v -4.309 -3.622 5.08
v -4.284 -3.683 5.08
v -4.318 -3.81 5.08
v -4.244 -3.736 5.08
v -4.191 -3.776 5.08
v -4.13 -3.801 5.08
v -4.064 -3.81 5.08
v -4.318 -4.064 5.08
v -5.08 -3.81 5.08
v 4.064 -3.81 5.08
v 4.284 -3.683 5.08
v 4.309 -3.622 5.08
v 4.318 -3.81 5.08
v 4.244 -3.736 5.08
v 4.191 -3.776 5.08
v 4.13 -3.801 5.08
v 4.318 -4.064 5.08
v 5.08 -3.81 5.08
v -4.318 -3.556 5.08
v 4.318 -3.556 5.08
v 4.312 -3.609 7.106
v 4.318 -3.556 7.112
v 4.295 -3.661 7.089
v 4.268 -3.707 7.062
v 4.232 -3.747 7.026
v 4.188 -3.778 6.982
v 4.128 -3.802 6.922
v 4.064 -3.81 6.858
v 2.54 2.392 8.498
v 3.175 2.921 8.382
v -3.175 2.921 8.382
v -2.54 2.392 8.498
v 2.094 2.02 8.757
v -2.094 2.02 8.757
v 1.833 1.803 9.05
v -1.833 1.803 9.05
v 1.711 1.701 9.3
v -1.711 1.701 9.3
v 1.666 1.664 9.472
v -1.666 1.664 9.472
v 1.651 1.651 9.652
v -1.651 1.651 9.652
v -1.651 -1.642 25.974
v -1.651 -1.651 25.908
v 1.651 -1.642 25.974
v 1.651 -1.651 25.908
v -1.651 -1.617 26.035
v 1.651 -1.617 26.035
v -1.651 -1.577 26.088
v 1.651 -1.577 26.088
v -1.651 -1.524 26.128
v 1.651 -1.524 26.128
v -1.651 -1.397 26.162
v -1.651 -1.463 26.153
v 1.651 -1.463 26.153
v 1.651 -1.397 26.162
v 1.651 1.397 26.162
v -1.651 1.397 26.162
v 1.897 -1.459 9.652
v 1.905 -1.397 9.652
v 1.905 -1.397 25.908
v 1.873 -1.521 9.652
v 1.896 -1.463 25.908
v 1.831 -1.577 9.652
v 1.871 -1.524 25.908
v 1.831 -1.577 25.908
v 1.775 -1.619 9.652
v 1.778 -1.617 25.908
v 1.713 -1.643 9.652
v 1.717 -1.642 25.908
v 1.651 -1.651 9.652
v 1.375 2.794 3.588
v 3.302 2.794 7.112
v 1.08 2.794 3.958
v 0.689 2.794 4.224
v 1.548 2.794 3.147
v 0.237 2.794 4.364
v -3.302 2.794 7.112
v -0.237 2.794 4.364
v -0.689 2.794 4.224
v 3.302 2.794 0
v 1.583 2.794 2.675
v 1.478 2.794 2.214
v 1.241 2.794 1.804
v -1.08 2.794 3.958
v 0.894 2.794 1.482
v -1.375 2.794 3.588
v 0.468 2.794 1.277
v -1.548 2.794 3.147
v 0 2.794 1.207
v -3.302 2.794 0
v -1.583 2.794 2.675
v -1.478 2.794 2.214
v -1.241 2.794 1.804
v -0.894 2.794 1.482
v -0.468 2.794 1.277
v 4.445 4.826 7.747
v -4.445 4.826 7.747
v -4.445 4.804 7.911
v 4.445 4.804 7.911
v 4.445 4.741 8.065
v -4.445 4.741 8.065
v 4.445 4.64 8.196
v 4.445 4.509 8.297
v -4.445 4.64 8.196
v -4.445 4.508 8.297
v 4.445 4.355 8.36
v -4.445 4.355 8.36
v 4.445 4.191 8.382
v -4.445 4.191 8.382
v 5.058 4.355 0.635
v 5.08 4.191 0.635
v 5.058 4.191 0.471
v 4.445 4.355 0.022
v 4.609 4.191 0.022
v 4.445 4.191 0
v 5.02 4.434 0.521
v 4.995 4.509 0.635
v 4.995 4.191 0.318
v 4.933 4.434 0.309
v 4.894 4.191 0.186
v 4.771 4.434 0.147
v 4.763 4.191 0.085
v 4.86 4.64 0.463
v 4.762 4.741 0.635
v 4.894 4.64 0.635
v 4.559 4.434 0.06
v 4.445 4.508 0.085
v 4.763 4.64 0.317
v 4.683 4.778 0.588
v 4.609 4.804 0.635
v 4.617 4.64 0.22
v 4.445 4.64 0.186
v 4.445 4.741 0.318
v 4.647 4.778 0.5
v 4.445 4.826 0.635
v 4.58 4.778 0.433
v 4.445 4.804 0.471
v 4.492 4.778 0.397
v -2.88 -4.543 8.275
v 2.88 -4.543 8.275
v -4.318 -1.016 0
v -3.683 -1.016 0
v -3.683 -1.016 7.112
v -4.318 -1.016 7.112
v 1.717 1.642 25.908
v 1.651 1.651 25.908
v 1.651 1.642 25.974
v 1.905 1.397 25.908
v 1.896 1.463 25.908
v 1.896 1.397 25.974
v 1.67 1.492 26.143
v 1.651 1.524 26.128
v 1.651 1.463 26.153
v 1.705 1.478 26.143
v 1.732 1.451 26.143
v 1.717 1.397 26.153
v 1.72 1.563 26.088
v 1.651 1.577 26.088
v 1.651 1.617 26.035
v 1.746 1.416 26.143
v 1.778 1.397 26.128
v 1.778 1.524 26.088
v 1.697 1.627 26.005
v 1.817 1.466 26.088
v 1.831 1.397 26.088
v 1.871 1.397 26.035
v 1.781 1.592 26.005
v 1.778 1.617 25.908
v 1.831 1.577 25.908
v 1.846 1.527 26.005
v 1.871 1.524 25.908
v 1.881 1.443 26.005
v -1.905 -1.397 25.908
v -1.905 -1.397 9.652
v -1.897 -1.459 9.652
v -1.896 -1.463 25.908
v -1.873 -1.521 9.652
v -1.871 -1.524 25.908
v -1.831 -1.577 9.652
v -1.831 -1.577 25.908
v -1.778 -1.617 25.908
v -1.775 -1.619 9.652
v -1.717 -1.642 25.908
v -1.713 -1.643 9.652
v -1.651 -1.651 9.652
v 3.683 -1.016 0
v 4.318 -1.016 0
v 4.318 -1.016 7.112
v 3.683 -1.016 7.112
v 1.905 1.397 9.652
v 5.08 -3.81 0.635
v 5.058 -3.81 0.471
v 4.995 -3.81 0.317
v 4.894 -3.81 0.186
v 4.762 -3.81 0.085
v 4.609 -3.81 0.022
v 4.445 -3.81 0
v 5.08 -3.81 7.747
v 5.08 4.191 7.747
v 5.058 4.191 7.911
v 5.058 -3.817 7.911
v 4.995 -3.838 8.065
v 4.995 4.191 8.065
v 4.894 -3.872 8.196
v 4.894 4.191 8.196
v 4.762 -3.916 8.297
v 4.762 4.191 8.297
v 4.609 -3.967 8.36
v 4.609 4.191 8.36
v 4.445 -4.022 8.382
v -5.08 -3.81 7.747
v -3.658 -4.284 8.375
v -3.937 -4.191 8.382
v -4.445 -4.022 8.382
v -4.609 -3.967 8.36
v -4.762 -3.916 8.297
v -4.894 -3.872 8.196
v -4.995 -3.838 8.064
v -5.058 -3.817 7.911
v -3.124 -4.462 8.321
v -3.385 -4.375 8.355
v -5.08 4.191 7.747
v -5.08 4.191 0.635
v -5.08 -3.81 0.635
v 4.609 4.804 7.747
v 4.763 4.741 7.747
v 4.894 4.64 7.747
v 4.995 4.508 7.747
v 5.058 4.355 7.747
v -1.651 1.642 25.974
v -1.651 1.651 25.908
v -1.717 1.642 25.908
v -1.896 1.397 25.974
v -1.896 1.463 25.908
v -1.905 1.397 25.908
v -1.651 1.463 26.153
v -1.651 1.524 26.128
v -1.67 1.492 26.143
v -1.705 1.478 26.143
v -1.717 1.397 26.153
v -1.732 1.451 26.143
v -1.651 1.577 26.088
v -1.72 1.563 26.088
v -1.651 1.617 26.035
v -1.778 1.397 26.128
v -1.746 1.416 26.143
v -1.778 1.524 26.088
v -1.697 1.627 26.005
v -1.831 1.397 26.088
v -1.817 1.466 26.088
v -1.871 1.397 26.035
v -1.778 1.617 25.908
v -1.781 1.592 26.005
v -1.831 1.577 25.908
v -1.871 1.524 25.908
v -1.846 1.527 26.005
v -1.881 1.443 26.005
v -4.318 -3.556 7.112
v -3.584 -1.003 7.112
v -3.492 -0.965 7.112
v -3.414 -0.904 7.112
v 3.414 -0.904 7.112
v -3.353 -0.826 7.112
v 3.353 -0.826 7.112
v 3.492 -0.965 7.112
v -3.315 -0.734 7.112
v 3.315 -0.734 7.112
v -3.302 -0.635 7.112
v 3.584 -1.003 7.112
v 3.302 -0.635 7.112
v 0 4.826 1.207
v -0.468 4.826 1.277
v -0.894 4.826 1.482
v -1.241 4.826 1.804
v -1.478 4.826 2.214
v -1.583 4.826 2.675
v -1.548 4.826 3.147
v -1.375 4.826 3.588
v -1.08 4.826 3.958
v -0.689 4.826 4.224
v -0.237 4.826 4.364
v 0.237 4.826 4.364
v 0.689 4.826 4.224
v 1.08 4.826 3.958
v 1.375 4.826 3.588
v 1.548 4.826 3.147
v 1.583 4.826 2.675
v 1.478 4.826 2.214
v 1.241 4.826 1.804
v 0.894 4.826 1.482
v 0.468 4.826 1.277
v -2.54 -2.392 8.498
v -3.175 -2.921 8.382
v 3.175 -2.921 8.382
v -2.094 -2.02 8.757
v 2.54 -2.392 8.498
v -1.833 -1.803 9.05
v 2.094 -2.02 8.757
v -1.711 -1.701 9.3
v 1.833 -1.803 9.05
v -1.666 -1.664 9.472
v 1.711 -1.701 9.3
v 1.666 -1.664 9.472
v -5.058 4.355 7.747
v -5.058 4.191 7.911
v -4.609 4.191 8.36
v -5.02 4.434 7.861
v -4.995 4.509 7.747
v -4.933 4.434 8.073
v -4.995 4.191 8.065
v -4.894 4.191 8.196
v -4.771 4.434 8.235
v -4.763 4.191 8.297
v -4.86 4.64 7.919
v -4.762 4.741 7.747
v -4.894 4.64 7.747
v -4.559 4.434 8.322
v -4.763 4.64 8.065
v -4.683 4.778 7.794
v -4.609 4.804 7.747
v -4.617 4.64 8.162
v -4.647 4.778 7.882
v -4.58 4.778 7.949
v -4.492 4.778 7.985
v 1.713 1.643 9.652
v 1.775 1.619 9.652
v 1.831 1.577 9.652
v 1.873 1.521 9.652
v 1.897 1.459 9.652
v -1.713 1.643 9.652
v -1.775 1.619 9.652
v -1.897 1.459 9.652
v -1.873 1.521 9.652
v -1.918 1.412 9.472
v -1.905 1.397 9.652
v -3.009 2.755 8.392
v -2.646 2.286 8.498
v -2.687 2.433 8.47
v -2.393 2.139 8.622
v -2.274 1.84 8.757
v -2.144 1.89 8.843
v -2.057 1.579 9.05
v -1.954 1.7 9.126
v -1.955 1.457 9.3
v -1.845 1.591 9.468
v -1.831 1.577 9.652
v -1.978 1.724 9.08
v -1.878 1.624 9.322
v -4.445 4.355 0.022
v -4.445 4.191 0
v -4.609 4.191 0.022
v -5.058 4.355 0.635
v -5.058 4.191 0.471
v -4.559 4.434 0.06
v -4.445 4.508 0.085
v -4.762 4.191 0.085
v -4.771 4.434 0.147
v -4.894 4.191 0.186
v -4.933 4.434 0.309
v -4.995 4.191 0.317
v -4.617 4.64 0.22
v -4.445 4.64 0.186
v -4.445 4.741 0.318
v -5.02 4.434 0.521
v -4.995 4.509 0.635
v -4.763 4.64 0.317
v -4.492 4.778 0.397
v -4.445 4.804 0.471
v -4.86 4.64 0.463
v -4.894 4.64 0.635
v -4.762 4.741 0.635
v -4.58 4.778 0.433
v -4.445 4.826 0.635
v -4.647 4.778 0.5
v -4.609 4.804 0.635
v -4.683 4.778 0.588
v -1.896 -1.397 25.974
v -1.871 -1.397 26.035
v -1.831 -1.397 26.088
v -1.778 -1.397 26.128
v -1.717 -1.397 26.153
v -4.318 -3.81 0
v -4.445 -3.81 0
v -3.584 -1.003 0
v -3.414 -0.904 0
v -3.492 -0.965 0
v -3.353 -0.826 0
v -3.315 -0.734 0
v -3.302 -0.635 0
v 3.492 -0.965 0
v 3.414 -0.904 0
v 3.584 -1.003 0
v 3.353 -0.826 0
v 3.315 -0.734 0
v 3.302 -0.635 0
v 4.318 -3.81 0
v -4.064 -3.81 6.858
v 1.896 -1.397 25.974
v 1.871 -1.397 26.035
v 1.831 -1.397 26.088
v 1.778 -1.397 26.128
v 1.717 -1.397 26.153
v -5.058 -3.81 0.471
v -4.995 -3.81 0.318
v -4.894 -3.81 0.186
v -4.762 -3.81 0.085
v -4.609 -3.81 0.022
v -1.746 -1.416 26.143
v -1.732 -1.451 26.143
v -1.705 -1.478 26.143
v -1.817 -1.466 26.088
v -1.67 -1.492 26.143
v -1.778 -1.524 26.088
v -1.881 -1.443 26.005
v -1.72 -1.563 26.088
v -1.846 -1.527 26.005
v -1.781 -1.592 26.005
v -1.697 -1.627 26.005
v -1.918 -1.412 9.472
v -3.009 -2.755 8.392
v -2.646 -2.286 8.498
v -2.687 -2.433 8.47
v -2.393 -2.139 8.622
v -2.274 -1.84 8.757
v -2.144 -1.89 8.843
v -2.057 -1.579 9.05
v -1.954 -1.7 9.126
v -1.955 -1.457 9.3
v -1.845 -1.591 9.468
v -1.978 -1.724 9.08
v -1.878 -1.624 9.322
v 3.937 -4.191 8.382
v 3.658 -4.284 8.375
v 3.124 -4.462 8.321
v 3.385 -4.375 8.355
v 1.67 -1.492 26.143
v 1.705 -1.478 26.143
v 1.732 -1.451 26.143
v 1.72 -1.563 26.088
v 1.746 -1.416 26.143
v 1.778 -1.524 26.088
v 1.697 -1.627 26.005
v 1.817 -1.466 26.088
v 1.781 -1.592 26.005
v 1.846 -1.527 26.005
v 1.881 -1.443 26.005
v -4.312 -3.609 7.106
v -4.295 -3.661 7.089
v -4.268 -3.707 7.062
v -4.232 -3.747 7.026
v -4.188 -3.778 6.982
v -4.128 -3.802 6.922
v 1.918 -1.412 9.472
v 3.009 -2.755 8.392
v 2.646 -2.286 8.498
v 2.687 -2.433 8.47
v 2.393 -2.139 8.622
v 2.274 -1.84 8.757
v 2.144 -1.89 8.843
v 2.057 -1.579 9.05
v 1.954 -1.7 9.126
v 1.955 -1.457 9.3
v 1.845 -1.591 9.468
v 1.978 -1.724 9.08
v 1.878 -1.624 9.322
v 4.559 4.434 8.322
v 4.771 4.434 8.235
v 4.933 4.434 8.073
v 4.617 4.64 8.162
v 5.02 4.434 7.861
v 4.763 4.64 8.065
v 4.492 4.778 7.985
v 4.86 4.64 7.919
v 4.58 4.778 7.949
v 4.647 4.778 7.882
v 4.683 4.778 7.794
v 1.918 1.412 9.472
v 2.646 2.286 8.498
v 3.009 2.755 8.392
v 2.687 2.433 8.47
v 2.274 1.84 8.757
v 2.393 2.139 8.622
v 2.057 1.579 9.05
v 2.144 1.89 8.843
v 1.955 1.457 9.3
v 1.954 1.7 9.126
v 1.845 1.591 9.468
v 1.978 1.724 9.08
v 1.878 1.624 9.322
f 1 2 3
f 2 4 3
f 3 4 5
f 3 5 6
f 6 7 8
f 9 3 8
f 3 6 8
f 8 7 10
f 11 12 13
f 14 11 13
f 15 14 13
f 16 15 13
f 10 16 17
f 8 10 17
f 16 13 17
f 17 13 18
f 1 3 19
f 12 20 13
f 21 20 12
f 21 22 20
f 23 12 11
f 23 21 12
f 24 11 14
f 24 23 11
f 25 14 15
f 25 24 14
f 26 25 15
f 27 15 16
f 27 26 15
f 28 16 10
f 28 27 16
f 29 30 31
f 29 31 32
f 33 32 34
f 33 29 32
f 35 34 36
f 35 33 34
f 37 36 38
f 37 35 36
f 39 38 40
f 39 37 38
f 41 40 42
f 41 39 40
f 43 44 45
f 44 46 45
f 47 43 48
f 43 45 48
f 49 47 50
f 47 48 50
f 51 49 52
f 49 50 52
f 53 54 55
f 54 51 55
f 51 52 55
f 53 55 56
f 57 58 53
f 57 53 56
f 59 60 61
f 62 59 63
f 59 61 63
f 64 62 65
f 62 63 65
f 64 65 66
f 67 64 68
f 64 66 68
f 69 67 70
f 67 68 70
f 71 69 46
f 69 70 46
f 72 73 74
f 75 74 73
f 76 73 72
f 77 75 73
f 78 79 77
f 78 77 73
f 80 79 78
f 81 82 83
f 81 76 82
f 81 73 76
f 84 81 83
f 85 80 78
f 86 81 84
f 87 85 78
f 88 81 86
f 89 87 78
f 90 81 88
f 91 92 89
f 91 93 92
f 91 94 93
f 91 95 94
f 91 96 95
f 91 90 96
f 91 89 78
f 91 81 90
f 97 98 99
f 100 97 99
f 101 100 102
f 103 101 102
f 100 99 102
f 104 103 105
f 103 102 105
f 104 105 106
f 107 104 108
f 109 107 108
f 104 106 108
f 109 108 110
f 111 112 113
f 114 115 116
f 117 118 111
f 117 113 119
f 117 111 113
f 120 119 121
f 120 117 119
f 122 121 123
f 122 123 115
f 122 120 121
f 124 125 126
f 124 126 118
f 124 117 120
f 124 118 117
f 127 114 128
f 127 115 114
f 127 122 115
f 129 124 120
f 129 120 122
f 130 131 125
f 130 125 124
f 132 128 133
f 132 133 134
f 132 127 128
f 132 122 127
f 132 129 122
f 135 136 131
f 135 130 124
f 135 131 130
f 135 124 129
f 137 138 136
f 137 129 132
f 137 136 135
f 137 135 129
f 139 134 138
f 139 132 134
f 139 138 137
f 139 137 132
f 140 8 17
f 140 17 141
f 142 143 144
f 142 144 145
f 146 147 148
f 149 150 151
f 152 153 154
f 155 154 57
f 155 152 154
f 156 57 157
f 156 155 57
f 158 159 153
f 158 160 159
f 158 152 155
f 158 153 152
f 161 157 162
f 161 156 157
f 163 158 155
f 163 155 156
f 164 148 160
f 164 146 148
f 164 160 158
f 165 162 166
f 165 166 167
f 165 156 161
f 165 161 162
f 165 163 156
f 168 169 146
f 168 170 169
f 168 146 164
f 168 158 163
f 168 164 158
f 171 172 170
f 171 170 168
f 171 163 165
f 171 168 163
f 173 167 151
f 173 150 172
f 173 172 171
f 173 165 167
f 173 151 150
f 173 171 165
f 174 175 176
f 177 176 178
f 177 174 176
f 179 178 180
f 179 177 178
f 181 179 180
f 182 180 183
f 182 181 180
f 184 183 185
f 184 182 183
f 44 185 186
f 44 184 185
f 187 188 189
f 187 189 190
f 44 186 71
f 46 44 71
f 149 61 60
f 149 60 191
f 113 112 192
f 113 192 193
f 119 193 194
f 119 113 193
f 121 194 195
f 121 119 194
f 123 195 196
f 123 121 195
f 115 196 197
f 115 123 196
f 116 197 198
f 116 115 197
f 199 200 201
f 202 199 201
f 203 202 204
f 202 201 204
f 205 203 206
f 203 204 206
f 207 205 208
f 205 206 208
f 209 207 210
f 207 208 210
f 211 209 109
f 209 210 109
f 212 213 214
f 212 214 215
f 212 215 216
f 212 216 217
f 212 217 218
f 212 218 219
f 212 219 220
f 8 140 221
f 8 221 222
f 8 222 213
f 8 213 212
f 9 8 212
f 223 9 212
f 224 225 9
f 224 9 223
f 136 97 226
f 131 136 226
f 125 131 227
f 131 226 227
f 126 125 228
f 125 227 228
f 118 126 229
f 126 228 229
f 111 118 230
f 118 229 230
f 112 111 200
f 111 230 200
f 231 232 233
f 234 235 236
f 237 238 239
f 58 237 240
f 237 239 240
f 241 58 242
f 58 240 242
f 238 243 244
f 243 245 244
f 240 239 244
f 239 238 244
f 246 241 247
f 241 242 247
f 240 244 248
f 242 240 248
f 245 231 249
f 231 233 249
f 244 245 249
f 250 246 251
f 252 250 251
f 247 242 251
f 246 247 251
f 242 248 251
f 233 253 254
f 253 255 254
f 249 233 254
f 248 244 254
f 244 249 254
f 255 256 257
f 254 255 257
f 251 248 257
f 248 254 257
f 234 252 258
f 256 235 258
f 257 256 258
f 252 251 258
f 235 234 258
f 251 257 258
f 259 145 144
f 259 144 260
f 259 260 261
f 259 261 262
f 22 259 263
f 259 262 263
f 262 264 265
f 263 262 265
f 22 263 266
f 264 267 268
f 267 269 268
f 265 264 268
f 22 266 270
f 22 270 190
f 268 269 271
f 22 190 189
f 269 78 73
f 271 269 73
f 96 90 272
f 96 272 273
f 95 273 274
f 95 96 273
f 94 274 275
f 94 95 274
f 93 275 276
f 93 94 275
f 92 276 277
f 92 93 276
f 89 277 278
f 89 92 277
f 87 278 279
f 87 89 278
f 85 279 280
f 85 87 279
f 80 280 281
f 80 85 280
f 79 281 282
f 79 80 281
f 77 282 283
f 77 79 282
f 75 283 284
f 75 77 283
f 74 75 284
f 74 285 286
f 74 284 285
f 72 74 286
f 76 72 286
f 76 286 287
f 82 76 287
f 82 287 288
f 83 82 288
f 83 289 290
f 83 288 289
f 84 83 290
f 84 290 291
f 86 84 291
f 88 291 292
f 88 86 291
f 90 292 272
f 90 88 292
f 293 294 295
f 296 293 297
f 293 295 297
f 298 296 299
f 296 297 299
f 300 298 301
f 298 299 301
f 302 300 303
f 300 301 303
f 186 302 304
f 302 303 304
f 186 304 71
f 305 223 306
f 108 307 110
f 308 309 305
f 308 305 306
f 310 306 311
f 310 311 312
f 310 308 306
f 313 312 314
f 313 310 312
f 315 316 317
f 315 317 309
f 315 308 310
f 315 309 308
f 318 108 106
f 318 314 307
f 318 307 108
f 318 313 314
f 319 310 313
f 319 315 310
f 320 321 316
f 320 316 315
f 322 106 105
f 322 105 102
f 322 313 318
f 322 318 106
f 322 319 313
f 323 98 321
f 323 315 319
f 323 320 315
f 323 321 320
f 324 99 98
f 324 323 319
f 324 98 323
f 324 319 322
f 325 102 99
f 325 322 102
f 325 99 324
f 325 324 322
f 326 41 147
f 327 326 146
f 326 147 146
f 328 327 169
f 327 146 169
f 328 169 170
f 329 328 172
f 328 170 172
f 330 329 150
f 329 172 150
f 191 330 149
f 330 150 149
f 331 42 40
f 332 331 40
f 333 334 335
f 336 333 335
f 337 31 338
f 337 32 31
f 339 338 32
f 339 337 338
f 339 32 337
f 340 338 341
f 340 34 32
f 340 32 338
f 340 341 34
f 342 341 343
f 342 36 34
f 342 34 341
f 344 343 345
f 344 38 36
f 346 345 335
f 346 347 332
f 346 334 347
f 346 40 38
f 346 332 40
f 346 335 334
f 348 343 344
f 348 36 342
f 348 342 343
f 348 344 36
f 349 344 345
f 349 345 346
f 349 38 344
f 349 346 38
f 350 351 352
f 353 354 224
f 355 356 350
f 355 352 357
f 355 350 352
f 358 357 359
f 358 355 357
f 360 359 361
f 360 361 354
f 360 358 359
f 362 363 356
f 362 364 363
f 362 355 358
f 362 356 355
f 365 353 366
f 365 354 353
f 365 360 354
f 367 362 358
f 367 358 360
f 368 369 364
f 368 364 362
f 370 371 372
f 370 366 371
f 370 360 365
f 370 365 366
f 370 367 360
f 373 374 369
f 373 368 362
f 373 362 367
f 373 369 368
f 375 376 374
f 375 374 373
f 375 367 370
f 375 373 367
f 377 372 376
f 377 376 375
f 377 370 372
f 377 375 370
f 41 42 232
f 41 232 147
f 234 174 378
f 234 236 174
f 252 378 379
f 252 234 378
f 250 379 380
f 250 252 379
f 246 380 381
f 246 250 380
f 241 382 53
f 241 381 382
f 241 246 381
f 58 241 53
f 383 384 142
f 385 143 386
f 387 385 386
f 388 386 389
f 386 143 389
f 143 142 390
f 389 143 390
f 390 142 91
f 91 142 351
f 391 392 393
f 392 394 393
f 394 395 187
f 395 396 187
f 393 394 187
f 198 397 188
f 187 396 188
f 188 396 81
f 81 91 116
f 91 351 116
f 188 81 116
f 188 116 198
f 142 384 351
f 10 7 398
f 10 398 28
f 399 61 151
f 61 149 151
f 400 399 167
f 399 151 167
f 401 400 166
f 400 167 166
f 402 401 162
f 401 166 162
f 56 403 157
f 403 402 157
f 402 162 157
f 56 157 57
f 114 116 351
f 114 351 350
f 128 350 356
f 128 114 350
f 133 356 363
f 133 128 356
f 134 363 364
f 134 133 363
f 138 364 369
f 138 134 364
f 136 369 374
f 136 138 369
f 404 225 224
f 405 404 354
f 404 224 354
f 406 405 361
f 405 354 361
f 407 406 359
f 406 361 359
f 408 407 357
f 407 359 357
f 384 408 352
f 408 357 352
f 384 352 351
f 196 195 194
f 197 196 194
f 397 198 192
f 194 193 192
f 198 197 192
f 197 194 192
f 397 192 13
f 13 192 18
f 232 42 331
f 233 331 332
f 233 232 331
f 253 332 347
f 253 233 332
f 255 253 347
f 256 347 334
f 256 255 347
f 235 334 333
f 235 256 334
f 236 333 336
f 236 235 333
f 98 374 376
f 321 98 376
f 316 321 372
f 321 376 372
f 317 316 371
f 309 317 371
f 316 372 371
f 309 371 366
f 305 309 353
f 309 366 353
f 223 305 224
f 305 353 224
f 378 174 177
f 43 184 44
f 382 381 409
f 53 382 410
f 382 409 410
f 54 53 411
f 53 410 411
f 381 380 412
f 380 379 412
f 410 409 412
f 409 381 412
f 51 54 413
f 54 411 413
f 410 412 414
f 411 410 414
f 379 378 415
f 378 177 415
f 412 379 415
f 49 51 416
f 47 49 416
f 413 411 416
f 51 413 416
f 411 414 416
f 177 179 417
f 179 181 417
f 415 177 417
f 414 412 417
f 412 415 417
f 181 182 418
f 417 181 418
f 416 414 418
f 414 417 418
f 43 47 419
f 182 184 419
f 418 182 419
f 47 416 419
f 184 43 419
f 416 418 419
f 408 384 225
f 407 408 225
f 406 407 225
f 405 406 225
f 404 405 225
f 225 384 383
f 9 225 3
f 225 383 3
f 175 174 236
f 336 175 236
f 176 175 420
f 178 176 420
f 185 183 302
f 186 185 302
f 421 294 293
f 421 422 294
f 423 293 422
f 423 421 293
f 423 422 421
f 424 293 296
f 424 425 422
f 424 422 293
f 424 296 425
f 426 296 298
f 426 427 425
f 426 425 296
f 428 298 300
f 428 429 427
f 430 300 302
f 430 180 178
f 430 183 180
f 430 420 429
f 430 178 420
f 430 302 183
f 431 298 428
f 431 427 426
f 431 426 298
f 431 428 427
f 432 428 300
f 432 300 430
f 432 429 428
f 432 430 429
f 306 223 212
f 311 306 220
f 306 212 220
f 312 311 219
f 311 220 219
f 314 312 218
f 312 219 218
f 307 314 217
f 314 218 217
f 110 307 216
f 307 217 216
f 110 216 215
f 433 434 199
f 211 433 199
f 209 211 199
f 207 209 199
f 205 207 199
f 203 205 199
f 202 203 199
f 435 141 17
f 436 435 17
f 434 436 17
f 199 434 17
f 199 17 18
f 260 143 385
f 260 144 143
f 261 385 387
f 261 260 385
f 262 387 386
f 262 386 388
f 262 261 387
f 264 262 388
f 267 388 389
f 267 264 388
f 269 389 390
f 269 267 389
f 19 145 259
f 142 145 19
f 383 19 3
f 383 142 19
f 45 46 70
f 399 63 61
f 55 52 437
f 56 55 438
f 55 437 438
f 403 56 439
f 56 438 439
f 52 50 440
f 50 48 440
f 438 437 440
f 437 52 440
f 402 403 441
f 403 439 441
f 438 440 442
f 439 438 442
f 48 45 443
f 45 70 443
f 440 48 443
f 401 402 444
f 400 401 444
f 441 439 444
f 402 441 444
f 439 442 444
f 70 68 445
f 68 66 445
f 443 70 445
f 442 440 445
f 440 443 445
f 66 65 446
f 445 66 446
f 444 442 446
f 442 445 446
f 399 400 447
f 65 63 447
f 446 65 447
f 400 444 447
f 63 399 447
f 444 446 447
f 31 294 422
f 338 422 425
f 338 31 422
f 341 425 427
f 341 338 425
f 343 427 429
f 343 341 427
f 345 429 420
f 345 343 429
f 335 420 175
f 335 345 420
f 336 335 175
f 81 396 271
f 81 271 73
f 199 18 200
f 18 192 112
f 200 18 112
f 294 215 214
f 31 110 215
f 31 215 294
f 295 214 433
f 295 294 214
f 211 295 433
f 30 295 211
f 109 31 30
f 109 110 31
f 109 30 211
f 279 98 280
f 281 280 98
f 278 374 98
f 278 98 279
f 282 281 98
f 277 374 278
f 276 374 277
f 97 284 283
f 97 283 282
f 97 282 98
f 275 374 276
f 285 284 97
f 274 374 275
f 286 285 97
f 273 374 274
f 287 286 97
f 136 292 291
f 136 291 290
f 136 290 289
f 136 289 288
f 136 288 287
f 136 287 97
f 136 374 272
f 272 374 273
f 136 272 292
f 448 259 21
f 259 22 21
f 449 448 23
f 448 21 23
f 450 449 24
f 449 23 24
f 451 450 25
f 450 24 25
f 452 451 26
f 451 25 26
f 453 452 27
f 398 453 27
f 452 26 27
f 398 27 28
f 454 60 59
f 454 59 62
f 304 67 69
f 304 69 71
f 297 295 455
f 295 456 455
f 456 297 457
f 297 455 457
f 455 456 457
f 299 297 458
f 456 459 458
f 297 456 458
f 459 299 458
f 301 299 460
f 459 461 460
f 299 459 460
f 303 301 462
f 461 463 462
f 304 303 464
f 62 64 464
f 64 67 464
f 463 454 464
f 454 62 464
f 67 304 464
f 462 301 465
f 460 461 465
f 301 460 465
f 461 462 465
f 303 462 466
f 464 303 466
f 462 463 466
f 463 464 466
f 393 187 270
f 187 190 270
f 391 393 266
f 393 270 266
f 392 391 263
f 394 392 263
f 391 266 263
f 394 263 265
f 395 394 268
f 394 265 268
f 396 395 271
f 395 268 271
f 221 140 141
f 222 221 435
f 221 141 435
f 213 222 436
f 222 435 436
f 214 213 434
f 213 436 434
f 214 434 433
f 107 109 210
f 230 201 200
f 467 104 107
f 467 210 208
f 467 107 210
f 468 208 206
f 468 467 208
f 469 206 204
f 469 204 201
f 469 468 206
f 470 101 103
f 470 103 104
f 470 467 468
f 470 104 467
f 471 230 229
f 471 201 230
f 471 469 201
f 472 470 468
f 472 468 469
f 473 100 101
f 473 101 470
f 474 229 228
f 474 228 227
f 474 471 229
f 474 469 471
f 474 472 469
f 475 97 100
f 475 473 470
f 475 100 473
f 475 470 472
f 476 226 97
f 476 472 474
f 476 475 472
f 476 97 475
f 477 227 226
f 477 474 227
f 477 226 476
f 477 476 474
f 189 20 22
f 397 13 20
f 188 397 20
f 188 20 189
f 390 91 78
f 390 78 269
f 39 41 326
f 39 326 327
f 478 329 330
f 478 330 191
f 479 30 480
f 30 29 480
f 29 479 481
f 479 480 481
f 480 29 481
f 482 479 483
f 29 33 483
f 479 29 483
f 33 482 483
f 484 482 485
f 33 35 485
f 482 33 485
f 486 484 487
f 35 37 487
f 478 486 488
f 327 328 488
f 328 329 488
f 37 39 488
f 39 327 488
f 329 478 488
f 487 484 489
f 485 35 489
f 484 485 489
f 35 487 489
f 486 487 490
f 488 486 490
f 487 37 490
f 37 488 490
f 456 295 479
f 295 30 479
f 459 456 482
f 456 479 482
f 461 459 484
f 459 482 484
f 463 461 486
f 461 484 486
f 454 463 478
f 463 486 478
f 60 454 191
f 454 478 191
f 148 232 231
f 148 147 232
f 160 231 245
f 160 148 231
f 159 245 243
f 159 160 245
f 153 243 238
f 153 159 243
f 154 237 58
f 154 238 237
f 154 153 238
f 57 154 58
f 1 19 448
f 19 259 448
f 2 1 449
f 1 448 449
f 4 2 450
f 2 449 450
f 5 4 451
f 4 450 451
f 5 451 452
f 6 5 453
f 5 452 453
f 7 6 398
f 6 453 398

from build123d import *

# Parameters (mm, degrees)
SKETCH1_W               = 10.16
SKETCH1_H               = 9.652
BOSS_EXTRUDE1_DEPTH     = 7.112
CUT_EXTRUDE1_DEPTH      = 14.021061708
CUT_EXTRUDE1_DEPTH_BACK = 14.021061708
SKETCH2_R               = 1.5875
SKETCH7_W               = 10.16
SKETCH7_H               = 9.652
BOSS_EXTRUDE3_DEPTH     = 1.27
FILLET1_R               = 0.635
FILLET3_R               = 0.635
FILLET4_R               = 0.381
CUT_EXTRUDE3_DEPTH      = 14.485940976
CUT_EXTRUDE3_DEPTH_BACK = 14.485940976
FILLET9_R               = 0.254
CUT_EXTRUDE7_DEPTH      = 9.654656319
SKETCH14_W              = 3.81
SKETCH14_H              = 3.302
BOSS_EXTRUDE4_DEPTH     = 17.78
FILLET14_R              = 1.27
FILLET15_R              = 0.254


with BuildPart() as part:
    # Sketch1 → Boss-Extrude1 (new body)
    with BuildSketch(Plane.XY):
        Rectangle(SKETCH1_W, SKETCH1_H)
        Polygon((-4.318, -3.81), (4.318, -3.81), (4.318, -1.016), (3.302, -1.016), (3.302, 2.794), (-3.302, 2.794), (-3.302, -1.016), (-4.318, -1.016), align=None, mode=Mode.SUBTRACT)
    extrude(amount=BOSS_EXTRUDE1_DEPTH)

    # Sketch2 → Cut-Extrude1 (cut, two sides: drawn at the far end of the back side and taken through both)
    with BuildSketch(Plane(origin=(0, 4.826, 0), x_dir=(1, 0, 0), z_dir=(0, 1, 0)).offset(-CUT_EXTRUDE1_DEPTH_BACK)):
        with Locations(Location((0, -2.794, 0), (0, 0, 90))):
            Circle(SKETCH2_R)
    extrude(amount=CUT_EXTRUDE1_DEPTH + CUT_EXTRUDE1_DEPTH_BACK, mode=Mode.SUBTRACT)

    # Sketch7 → Boss-Extrude3 (add)
    with BuildSketch(Plane.XY.offset(7.112)):
        Rectangle(SKETCH7_W, SKETCH7_H)
    extrude(amount=BOSS_EXTRUDE3_DEPTH)

    # Fillet1
    fillet1_edges = [part.edges().sort_by_distance(p)[0] for p in [
        (-5.08, 0, 0),
        (0, 4.826, 0),
        (5.08, 0, 0),
    ]]
    fillet(fillet1_edges, radius=FILLET1_R)

    # Fillet3
    # the kernel refuses this fillet: 0.635 mm, written as the material it takes off along each edge
    with BuildSketch(Plane(origin=(4.445, 4.191, 0.635), x_dir=(1, 0, 0), z_dir=(0, 1, 0))) as fillet3_piece_1_section:
        Polygon((0, 0), (FILLET3_R, 0), (FILLET3_R, FILLET3_R), (0, FILLET3_R), align=None)
    fillet3_piece_1 = extrude(amount=FILLET3_R, mode=Mode.PRIVATE)
    fillet3_piece_1 = fillet3_piece_1 - Plane(origin=(4.445, 4.191, 0.635), x_dir=(-0.7071067811865475, 0, 0.7071067811865475), z_dir=(0, 1, 0)) * Sphere(FILLET3_R, mode=Mode.PRIVATE)
    add(fillet3_piece_1, mode=Mode.SUBTRACT)
    with BuildSketch(Plane(origin=(-4.445, 4.191, 0.635), x_dir=(-1, 0, 0), z_dir=(0, 1, 0))) as fillet3_piece_2_section:
        Polygon((0, 0), (FILLET3_R, 0), (FILLET3_R, -FILLET3_R), (0, -FILLET3_R), align=None)
    fillet3_piece_2 = extrude(amount=FILLET3_R, mode=Mode.PRIVATE)
    fillet3_piece_2 = fillet3_piece_2 - Plane(origin=(-4.445, 4.191, 0.635), x_dir=(0.7071067811865475, 0, 0.7071067811865475), z_dir=(0, 1, 0)) * Sphere(FILLET3_R, mode=Mode.PRIVATE)
    add(fillet3_piece_2, mode=Mode.SUBTRACT)
    with BuildSketch(Plane(origin=(-4.445, -4.191, 7.747), x_dir=(0, 0, 1), z_dir=(-1, 0, 0))) as fillet3_piece_3_section:
        Polygon((0, 0), (FILLET3_R, 0), (FILLET3_R, -FILLET3_R), (0, -FILLET3_R), align=None)
    fillet3_piece_3 = extrude(amount=FILLET3_R, mode=Mode.PRIVATE)
    fillet3_piece_3 = fillet3_piece_3 - Plane(origin=(-4.445, -4.191, 7.747), x_dir=(0, 0.7071067811865475, -0.7071067811865475), z_dir=(-1, 0, 0)) * Sphere(FILLET3_R, mode=Mode.PRIVATE)
    add(fillet3_piece_3, mode=Mode.SUBTRACT)
    with BuildSketch(Plane(origin=(-4.445, 4.191, 7.747), x_dir=(-1, 0, 0), z_dir=(0, 1, 0))) as fillet3_piece_4_section:
        Polygon((0, 0), (FILLET3_R, 0), (FILLET3_R, FILLET3_R), (0, FILLET3_R), align=None)
    fillet3_piece_4 = extrude(amount=FILLET3_R, mode=Mode.PRIVATE)
    fillet3_piece_4 = fillet3_piece_4 - Plane(origin=(-4.445, 4.191, 7.747), x_dir=(0.7071067811865475, 0, -0.7071067811865475), z_dir=(0, 1, 0)) * Sphere(FILLET3_R, mode=Mode.PRIVATE)
    add(fillet3_piece_4, mode=Mode.SUBTRACT)
    with BuildSketch(Plane(origin=(4.445, -4.191, 7.747), x_dir=(1, 0, 0), z_dir=(0, 0, 1))) as fillet3_piece_5_section:
        Polygon((0, 0), (FILLET3_R, 0), (FILLET3_R, -FILLET3_R), (0, -FILLET3_R), align=None)
    fillet3_piece_5 = extrude(amount=FILLET3_R, mode=Mode.PRIVATE)
    fillet3_piece_5 = fillet3_piece_5 - Plane(origin=(4.445, -4.191, 7.747), x_dir=(-0.7071067811865476, 0.7071067811865475, 0), z_dir=(0, 0, 1)) * Sphere(FILLET3_R, mode=Mode.PRIVATE)
    add(fillet3_piece_5, mode=Mode.SUBTRACT)
    with BuildSketch(Plane(origin=(4.445, 4.191, 7.747), x_dir=(0, 0, 1), z_dir=(0, 1, 0))) as fillet3_piece_6_section:
        Polygon((0, 0), (FILLET3_R, 0), (FILLET3_R, FILLET3_R), (0, FILLET3_R), align=None)
    fillet3_piece_6 = extrude(amount=FILLET3_R, mode=Mode.PRIVATE)
    fillet3_piece_6 = fillet3_piece_6 - Plane(origin=(4.445, 4.191, 7.747), x_dir=(-0.7071067811865475, 0, -0.7071067811865475), z_dir=(0, 1, 0)) * Sphere(FILLET3_R, mode=Mode.PRIVATE)
    add(fillet3_piece_6, mode=Mode.SUBTRACT)
    with BuildSketch(Plane(origin=(-5.08, -4.191, 8.382), x_dir=(0, 0, -1), z_dir=(0, 1, 0))) as fillet3_piece_7:
        with BuildLine():
            CenterArc((FILLET3_R, -FILLET3_R), FILLET3_R, 90, 90)
            Line((0, -FILLET3_R), (0, 0))
            Line((0, 0), (FILLET3_R, 0))
        make_face()
    extrude(amount=8.382, mode=Mode.SUBTRACT)
    with BuildSketch(Plane(origin=(4.445, -4.826, 8.382), x_dir=(0, 1, 0), z_dir=(-1, 0, 0)), Plane(origin=(4.445, -4.826, 0), x_dir=(0, 0, 1), z_dir=(-1, 0, 0))) as fillet3_piece_8:
        with BuildLine():
            CenterArc((FILLET3_R, FILLET3_R), FILLET3_R, 180, 90)
            Line((0, FILLET3_R), (0, 0))
            Line((0, 0), (FILLET3_R, 0))
        make_face()
    extrude(amount=8.89, mode=Mode.SUBTRACT)
    with BuildSketch(Plane(origin=(5.08, 4.191, 8.382), x_dir=(-1, 0, 0), z_dir=(0, -1, 0))) as fillet3_piece_9:
        with BuildLine():
            CenterArc((FILLET3_R, FILLET3_R), FILLET3_R, 180, 90)
            Line((0, FILLET3_R), (0, 0))
            Line((0, 0), (FILLET3_R, 0))
        make_face()
    extrude(amount=8.382, mode=Mode.SUBTRACT)
    with BuildSketch(Plane(origin=(-4.445, 4.826, 8.382), x_dir=(0, 0, -1), z_dir=(1, 0, 0))) as fillet3_piece_10:
        with BuildLine():
            CenterArc((FILLET3_R, -FILLET3_R), FILLET3_R, 90, 90)
            Line((0, -FILLET3_R), (0, 0))
            Line((0, 0), (FILLET3_R, 0))
        make_face()
    extrude(amount=8.89, mode=Mode.SUBTRACT)
    with BuildSketch(Plane(origin=(4.445, -4.826, 0.635), x_dir=(0, 0, -1), z_dir=(-1, 0, 0))) as fillet3_piece_11:
        with BuildLine():
            CenterArc((0.635 - FILLET3_R, -FILLET3_R), FILLET3_R, 0, 90)
            Line((0.635, -FILLET3_R), (0.635, 0))
            Line((0.635, 0), (0.635 - FILLET3_R, 0))
        make_face()
    revolve(axis=Axis((4.445, -4.826, 0.635), (0, -1, 0)), revolution_arc=90, mode=Mode.SUBTRACT)
    with BuildSketch(Plane(origin=(-4.445, -4.826, 0.635), x_dir=(0, 0, -1), z_dir=(1, 0, 0))) as fillet3_piece_12:
        with BuildLine():
            CenterArc((0.635 - FILLET3_R, FILLET3_R), FILLET3_R, 270, 90)
            Line((0.635, FILLET3_R), (0.635, 0))
            Line((0.635, 0), (0.635 - FILLET3_R, 0))
        make_face()
    revolve(axis=Axis((-4.445, -4.826, 0.635), (0, 1, 0)), revolution_arc=90, mode=Mode.SUBTRACT)
    with BuildSketch(Plane(origin=(5.08, -4.826, 7.747), x_dir=(0, 1, 0), z_dir=(0, 0, -1)), Plane(origin=(-5.08, -4.826, 0.635), x_dir=(0, 1, 0), z_dir=(0, 0, 1)), Plane(origin=(-5.08, 4.826, 0.635), x_dir=(1, 0, 0), z_dir=(0, 0, 1)), Plane(origin=(5.08, 4.826, 7.747), x_dir=(-1, 0, 0), z_dir=(0, 0, -1))) as fillet3_piece_13:
        with BuildLine():
            CenterArc((FILLET3_R, -FILLET3_R), FILLET3_R, 90, 90)
            Line((0, -FILLET3_R), (0, 0))
            Line((0, 0), (FILLET3_R, 0))
        make_face()
    extrude(amount=7.112, mode=Mode.SUBTRACT)

    # Fillet4
    fillet4_edges = [part.edges().sort_by_distance(p)[0] for p in [
        (3.302, -1.016, 3.556),
        (-3.302, -1.016, 3.556),
    ]]
    fillet(fillet4_edges, radius=FILLET4_R)

    # Sketch11 → Cut-Extrude3 (cut, two sides: drawn at the far end of the back side and taken through both)
    with BuildSketch(Plane.ZY.offset(-4.318).offset(-CUT_EXTRUDE3_DEPTH_BACK)):
        Polygon((0, -3.81), (5.08, -3.81), (5.08, -4.064), (10.16, -4.826), (0, -4.826), align=None)
    extrude(amount=CUT_EXTRUDE3_DEPTH + CUT_EXTRUDE3_DEPTH_BACK, mode=Mode.SUBTRACT)

    # Fillet9
    fillet9_edges = [part.edges().sort_by_distance(p)[0] for p in [
        (-4.318, -3.81, 6.096),
        (4.318, -3.81, 6.096),
        (0, -3.81, 7.112),
    ]]
    fillet(fillet9_edges, radius=FILLET9_R)

    # Sketch13 → Cut-Extrude7 (cut, through all)
    with BuildSketch(Plane(origin=(0, 0, 5.08), x_dir=(-1, 0, 0), z_dir=(0, 0, -1))):
        Polygon((-5.08, -3.81), (-5.08, -4.826), (-2.032, -4.826), align=None)
        Polygon((5.08, -3.81), (5.08, -4.826), (2.032, -4.826), align=None)
    extrude(amount=-CUT_EXTRUDE7_DEPTH, mode=Mode.SUBTRACT)

    # Sketch14 → Boss-Extrude4 (add)
    with BuildSketch(Plane.XY.offset(8.382)):
        Rectangle(SKETCH14_W, SKETCH14_H)
    extrude(amount=BOSS_EXTRUDE4_DEPTH)

    # Fillet14
    fillet14_edges = [part.edges().sort_by_distance(p)[0] for p in [
        (0, 1.651, 8.382),
        (-1.905, 0, 8.382),
        (0, -1.651, 8.382),
        (1.905, 0, 8.382),
    ]]
    fillet(fillet14_edges, radius=FILLET14_R)

    # Fillet15
    fillet15_edges = [part.edges().sort_by_distance(p)[0] for p in [
        (1.905, 1.651, 17.907),
        (-1.905, 1.651, 17.907),
        (-1.905, -1.651, 17.907),
        (1.905, -1.651, 17.907),
        (0, 1.651, 26.162),
        (-1.905, 0, 26.162),
        (0, -1.651, 26.162),
        (1.905, 0, 26.162),
        (2.354517888, 2.100517888, 8.682614059),
        (2.354517888, -2.100517888, 8.682614059),
        (-2.354517888, 2.100517888, 8.682614059),
        (-2.354517888, -2.100517888, 8.682614059),
    ]]
    fillet(fillet15_edges, radius=FILLET15_R)


solid = part.part
